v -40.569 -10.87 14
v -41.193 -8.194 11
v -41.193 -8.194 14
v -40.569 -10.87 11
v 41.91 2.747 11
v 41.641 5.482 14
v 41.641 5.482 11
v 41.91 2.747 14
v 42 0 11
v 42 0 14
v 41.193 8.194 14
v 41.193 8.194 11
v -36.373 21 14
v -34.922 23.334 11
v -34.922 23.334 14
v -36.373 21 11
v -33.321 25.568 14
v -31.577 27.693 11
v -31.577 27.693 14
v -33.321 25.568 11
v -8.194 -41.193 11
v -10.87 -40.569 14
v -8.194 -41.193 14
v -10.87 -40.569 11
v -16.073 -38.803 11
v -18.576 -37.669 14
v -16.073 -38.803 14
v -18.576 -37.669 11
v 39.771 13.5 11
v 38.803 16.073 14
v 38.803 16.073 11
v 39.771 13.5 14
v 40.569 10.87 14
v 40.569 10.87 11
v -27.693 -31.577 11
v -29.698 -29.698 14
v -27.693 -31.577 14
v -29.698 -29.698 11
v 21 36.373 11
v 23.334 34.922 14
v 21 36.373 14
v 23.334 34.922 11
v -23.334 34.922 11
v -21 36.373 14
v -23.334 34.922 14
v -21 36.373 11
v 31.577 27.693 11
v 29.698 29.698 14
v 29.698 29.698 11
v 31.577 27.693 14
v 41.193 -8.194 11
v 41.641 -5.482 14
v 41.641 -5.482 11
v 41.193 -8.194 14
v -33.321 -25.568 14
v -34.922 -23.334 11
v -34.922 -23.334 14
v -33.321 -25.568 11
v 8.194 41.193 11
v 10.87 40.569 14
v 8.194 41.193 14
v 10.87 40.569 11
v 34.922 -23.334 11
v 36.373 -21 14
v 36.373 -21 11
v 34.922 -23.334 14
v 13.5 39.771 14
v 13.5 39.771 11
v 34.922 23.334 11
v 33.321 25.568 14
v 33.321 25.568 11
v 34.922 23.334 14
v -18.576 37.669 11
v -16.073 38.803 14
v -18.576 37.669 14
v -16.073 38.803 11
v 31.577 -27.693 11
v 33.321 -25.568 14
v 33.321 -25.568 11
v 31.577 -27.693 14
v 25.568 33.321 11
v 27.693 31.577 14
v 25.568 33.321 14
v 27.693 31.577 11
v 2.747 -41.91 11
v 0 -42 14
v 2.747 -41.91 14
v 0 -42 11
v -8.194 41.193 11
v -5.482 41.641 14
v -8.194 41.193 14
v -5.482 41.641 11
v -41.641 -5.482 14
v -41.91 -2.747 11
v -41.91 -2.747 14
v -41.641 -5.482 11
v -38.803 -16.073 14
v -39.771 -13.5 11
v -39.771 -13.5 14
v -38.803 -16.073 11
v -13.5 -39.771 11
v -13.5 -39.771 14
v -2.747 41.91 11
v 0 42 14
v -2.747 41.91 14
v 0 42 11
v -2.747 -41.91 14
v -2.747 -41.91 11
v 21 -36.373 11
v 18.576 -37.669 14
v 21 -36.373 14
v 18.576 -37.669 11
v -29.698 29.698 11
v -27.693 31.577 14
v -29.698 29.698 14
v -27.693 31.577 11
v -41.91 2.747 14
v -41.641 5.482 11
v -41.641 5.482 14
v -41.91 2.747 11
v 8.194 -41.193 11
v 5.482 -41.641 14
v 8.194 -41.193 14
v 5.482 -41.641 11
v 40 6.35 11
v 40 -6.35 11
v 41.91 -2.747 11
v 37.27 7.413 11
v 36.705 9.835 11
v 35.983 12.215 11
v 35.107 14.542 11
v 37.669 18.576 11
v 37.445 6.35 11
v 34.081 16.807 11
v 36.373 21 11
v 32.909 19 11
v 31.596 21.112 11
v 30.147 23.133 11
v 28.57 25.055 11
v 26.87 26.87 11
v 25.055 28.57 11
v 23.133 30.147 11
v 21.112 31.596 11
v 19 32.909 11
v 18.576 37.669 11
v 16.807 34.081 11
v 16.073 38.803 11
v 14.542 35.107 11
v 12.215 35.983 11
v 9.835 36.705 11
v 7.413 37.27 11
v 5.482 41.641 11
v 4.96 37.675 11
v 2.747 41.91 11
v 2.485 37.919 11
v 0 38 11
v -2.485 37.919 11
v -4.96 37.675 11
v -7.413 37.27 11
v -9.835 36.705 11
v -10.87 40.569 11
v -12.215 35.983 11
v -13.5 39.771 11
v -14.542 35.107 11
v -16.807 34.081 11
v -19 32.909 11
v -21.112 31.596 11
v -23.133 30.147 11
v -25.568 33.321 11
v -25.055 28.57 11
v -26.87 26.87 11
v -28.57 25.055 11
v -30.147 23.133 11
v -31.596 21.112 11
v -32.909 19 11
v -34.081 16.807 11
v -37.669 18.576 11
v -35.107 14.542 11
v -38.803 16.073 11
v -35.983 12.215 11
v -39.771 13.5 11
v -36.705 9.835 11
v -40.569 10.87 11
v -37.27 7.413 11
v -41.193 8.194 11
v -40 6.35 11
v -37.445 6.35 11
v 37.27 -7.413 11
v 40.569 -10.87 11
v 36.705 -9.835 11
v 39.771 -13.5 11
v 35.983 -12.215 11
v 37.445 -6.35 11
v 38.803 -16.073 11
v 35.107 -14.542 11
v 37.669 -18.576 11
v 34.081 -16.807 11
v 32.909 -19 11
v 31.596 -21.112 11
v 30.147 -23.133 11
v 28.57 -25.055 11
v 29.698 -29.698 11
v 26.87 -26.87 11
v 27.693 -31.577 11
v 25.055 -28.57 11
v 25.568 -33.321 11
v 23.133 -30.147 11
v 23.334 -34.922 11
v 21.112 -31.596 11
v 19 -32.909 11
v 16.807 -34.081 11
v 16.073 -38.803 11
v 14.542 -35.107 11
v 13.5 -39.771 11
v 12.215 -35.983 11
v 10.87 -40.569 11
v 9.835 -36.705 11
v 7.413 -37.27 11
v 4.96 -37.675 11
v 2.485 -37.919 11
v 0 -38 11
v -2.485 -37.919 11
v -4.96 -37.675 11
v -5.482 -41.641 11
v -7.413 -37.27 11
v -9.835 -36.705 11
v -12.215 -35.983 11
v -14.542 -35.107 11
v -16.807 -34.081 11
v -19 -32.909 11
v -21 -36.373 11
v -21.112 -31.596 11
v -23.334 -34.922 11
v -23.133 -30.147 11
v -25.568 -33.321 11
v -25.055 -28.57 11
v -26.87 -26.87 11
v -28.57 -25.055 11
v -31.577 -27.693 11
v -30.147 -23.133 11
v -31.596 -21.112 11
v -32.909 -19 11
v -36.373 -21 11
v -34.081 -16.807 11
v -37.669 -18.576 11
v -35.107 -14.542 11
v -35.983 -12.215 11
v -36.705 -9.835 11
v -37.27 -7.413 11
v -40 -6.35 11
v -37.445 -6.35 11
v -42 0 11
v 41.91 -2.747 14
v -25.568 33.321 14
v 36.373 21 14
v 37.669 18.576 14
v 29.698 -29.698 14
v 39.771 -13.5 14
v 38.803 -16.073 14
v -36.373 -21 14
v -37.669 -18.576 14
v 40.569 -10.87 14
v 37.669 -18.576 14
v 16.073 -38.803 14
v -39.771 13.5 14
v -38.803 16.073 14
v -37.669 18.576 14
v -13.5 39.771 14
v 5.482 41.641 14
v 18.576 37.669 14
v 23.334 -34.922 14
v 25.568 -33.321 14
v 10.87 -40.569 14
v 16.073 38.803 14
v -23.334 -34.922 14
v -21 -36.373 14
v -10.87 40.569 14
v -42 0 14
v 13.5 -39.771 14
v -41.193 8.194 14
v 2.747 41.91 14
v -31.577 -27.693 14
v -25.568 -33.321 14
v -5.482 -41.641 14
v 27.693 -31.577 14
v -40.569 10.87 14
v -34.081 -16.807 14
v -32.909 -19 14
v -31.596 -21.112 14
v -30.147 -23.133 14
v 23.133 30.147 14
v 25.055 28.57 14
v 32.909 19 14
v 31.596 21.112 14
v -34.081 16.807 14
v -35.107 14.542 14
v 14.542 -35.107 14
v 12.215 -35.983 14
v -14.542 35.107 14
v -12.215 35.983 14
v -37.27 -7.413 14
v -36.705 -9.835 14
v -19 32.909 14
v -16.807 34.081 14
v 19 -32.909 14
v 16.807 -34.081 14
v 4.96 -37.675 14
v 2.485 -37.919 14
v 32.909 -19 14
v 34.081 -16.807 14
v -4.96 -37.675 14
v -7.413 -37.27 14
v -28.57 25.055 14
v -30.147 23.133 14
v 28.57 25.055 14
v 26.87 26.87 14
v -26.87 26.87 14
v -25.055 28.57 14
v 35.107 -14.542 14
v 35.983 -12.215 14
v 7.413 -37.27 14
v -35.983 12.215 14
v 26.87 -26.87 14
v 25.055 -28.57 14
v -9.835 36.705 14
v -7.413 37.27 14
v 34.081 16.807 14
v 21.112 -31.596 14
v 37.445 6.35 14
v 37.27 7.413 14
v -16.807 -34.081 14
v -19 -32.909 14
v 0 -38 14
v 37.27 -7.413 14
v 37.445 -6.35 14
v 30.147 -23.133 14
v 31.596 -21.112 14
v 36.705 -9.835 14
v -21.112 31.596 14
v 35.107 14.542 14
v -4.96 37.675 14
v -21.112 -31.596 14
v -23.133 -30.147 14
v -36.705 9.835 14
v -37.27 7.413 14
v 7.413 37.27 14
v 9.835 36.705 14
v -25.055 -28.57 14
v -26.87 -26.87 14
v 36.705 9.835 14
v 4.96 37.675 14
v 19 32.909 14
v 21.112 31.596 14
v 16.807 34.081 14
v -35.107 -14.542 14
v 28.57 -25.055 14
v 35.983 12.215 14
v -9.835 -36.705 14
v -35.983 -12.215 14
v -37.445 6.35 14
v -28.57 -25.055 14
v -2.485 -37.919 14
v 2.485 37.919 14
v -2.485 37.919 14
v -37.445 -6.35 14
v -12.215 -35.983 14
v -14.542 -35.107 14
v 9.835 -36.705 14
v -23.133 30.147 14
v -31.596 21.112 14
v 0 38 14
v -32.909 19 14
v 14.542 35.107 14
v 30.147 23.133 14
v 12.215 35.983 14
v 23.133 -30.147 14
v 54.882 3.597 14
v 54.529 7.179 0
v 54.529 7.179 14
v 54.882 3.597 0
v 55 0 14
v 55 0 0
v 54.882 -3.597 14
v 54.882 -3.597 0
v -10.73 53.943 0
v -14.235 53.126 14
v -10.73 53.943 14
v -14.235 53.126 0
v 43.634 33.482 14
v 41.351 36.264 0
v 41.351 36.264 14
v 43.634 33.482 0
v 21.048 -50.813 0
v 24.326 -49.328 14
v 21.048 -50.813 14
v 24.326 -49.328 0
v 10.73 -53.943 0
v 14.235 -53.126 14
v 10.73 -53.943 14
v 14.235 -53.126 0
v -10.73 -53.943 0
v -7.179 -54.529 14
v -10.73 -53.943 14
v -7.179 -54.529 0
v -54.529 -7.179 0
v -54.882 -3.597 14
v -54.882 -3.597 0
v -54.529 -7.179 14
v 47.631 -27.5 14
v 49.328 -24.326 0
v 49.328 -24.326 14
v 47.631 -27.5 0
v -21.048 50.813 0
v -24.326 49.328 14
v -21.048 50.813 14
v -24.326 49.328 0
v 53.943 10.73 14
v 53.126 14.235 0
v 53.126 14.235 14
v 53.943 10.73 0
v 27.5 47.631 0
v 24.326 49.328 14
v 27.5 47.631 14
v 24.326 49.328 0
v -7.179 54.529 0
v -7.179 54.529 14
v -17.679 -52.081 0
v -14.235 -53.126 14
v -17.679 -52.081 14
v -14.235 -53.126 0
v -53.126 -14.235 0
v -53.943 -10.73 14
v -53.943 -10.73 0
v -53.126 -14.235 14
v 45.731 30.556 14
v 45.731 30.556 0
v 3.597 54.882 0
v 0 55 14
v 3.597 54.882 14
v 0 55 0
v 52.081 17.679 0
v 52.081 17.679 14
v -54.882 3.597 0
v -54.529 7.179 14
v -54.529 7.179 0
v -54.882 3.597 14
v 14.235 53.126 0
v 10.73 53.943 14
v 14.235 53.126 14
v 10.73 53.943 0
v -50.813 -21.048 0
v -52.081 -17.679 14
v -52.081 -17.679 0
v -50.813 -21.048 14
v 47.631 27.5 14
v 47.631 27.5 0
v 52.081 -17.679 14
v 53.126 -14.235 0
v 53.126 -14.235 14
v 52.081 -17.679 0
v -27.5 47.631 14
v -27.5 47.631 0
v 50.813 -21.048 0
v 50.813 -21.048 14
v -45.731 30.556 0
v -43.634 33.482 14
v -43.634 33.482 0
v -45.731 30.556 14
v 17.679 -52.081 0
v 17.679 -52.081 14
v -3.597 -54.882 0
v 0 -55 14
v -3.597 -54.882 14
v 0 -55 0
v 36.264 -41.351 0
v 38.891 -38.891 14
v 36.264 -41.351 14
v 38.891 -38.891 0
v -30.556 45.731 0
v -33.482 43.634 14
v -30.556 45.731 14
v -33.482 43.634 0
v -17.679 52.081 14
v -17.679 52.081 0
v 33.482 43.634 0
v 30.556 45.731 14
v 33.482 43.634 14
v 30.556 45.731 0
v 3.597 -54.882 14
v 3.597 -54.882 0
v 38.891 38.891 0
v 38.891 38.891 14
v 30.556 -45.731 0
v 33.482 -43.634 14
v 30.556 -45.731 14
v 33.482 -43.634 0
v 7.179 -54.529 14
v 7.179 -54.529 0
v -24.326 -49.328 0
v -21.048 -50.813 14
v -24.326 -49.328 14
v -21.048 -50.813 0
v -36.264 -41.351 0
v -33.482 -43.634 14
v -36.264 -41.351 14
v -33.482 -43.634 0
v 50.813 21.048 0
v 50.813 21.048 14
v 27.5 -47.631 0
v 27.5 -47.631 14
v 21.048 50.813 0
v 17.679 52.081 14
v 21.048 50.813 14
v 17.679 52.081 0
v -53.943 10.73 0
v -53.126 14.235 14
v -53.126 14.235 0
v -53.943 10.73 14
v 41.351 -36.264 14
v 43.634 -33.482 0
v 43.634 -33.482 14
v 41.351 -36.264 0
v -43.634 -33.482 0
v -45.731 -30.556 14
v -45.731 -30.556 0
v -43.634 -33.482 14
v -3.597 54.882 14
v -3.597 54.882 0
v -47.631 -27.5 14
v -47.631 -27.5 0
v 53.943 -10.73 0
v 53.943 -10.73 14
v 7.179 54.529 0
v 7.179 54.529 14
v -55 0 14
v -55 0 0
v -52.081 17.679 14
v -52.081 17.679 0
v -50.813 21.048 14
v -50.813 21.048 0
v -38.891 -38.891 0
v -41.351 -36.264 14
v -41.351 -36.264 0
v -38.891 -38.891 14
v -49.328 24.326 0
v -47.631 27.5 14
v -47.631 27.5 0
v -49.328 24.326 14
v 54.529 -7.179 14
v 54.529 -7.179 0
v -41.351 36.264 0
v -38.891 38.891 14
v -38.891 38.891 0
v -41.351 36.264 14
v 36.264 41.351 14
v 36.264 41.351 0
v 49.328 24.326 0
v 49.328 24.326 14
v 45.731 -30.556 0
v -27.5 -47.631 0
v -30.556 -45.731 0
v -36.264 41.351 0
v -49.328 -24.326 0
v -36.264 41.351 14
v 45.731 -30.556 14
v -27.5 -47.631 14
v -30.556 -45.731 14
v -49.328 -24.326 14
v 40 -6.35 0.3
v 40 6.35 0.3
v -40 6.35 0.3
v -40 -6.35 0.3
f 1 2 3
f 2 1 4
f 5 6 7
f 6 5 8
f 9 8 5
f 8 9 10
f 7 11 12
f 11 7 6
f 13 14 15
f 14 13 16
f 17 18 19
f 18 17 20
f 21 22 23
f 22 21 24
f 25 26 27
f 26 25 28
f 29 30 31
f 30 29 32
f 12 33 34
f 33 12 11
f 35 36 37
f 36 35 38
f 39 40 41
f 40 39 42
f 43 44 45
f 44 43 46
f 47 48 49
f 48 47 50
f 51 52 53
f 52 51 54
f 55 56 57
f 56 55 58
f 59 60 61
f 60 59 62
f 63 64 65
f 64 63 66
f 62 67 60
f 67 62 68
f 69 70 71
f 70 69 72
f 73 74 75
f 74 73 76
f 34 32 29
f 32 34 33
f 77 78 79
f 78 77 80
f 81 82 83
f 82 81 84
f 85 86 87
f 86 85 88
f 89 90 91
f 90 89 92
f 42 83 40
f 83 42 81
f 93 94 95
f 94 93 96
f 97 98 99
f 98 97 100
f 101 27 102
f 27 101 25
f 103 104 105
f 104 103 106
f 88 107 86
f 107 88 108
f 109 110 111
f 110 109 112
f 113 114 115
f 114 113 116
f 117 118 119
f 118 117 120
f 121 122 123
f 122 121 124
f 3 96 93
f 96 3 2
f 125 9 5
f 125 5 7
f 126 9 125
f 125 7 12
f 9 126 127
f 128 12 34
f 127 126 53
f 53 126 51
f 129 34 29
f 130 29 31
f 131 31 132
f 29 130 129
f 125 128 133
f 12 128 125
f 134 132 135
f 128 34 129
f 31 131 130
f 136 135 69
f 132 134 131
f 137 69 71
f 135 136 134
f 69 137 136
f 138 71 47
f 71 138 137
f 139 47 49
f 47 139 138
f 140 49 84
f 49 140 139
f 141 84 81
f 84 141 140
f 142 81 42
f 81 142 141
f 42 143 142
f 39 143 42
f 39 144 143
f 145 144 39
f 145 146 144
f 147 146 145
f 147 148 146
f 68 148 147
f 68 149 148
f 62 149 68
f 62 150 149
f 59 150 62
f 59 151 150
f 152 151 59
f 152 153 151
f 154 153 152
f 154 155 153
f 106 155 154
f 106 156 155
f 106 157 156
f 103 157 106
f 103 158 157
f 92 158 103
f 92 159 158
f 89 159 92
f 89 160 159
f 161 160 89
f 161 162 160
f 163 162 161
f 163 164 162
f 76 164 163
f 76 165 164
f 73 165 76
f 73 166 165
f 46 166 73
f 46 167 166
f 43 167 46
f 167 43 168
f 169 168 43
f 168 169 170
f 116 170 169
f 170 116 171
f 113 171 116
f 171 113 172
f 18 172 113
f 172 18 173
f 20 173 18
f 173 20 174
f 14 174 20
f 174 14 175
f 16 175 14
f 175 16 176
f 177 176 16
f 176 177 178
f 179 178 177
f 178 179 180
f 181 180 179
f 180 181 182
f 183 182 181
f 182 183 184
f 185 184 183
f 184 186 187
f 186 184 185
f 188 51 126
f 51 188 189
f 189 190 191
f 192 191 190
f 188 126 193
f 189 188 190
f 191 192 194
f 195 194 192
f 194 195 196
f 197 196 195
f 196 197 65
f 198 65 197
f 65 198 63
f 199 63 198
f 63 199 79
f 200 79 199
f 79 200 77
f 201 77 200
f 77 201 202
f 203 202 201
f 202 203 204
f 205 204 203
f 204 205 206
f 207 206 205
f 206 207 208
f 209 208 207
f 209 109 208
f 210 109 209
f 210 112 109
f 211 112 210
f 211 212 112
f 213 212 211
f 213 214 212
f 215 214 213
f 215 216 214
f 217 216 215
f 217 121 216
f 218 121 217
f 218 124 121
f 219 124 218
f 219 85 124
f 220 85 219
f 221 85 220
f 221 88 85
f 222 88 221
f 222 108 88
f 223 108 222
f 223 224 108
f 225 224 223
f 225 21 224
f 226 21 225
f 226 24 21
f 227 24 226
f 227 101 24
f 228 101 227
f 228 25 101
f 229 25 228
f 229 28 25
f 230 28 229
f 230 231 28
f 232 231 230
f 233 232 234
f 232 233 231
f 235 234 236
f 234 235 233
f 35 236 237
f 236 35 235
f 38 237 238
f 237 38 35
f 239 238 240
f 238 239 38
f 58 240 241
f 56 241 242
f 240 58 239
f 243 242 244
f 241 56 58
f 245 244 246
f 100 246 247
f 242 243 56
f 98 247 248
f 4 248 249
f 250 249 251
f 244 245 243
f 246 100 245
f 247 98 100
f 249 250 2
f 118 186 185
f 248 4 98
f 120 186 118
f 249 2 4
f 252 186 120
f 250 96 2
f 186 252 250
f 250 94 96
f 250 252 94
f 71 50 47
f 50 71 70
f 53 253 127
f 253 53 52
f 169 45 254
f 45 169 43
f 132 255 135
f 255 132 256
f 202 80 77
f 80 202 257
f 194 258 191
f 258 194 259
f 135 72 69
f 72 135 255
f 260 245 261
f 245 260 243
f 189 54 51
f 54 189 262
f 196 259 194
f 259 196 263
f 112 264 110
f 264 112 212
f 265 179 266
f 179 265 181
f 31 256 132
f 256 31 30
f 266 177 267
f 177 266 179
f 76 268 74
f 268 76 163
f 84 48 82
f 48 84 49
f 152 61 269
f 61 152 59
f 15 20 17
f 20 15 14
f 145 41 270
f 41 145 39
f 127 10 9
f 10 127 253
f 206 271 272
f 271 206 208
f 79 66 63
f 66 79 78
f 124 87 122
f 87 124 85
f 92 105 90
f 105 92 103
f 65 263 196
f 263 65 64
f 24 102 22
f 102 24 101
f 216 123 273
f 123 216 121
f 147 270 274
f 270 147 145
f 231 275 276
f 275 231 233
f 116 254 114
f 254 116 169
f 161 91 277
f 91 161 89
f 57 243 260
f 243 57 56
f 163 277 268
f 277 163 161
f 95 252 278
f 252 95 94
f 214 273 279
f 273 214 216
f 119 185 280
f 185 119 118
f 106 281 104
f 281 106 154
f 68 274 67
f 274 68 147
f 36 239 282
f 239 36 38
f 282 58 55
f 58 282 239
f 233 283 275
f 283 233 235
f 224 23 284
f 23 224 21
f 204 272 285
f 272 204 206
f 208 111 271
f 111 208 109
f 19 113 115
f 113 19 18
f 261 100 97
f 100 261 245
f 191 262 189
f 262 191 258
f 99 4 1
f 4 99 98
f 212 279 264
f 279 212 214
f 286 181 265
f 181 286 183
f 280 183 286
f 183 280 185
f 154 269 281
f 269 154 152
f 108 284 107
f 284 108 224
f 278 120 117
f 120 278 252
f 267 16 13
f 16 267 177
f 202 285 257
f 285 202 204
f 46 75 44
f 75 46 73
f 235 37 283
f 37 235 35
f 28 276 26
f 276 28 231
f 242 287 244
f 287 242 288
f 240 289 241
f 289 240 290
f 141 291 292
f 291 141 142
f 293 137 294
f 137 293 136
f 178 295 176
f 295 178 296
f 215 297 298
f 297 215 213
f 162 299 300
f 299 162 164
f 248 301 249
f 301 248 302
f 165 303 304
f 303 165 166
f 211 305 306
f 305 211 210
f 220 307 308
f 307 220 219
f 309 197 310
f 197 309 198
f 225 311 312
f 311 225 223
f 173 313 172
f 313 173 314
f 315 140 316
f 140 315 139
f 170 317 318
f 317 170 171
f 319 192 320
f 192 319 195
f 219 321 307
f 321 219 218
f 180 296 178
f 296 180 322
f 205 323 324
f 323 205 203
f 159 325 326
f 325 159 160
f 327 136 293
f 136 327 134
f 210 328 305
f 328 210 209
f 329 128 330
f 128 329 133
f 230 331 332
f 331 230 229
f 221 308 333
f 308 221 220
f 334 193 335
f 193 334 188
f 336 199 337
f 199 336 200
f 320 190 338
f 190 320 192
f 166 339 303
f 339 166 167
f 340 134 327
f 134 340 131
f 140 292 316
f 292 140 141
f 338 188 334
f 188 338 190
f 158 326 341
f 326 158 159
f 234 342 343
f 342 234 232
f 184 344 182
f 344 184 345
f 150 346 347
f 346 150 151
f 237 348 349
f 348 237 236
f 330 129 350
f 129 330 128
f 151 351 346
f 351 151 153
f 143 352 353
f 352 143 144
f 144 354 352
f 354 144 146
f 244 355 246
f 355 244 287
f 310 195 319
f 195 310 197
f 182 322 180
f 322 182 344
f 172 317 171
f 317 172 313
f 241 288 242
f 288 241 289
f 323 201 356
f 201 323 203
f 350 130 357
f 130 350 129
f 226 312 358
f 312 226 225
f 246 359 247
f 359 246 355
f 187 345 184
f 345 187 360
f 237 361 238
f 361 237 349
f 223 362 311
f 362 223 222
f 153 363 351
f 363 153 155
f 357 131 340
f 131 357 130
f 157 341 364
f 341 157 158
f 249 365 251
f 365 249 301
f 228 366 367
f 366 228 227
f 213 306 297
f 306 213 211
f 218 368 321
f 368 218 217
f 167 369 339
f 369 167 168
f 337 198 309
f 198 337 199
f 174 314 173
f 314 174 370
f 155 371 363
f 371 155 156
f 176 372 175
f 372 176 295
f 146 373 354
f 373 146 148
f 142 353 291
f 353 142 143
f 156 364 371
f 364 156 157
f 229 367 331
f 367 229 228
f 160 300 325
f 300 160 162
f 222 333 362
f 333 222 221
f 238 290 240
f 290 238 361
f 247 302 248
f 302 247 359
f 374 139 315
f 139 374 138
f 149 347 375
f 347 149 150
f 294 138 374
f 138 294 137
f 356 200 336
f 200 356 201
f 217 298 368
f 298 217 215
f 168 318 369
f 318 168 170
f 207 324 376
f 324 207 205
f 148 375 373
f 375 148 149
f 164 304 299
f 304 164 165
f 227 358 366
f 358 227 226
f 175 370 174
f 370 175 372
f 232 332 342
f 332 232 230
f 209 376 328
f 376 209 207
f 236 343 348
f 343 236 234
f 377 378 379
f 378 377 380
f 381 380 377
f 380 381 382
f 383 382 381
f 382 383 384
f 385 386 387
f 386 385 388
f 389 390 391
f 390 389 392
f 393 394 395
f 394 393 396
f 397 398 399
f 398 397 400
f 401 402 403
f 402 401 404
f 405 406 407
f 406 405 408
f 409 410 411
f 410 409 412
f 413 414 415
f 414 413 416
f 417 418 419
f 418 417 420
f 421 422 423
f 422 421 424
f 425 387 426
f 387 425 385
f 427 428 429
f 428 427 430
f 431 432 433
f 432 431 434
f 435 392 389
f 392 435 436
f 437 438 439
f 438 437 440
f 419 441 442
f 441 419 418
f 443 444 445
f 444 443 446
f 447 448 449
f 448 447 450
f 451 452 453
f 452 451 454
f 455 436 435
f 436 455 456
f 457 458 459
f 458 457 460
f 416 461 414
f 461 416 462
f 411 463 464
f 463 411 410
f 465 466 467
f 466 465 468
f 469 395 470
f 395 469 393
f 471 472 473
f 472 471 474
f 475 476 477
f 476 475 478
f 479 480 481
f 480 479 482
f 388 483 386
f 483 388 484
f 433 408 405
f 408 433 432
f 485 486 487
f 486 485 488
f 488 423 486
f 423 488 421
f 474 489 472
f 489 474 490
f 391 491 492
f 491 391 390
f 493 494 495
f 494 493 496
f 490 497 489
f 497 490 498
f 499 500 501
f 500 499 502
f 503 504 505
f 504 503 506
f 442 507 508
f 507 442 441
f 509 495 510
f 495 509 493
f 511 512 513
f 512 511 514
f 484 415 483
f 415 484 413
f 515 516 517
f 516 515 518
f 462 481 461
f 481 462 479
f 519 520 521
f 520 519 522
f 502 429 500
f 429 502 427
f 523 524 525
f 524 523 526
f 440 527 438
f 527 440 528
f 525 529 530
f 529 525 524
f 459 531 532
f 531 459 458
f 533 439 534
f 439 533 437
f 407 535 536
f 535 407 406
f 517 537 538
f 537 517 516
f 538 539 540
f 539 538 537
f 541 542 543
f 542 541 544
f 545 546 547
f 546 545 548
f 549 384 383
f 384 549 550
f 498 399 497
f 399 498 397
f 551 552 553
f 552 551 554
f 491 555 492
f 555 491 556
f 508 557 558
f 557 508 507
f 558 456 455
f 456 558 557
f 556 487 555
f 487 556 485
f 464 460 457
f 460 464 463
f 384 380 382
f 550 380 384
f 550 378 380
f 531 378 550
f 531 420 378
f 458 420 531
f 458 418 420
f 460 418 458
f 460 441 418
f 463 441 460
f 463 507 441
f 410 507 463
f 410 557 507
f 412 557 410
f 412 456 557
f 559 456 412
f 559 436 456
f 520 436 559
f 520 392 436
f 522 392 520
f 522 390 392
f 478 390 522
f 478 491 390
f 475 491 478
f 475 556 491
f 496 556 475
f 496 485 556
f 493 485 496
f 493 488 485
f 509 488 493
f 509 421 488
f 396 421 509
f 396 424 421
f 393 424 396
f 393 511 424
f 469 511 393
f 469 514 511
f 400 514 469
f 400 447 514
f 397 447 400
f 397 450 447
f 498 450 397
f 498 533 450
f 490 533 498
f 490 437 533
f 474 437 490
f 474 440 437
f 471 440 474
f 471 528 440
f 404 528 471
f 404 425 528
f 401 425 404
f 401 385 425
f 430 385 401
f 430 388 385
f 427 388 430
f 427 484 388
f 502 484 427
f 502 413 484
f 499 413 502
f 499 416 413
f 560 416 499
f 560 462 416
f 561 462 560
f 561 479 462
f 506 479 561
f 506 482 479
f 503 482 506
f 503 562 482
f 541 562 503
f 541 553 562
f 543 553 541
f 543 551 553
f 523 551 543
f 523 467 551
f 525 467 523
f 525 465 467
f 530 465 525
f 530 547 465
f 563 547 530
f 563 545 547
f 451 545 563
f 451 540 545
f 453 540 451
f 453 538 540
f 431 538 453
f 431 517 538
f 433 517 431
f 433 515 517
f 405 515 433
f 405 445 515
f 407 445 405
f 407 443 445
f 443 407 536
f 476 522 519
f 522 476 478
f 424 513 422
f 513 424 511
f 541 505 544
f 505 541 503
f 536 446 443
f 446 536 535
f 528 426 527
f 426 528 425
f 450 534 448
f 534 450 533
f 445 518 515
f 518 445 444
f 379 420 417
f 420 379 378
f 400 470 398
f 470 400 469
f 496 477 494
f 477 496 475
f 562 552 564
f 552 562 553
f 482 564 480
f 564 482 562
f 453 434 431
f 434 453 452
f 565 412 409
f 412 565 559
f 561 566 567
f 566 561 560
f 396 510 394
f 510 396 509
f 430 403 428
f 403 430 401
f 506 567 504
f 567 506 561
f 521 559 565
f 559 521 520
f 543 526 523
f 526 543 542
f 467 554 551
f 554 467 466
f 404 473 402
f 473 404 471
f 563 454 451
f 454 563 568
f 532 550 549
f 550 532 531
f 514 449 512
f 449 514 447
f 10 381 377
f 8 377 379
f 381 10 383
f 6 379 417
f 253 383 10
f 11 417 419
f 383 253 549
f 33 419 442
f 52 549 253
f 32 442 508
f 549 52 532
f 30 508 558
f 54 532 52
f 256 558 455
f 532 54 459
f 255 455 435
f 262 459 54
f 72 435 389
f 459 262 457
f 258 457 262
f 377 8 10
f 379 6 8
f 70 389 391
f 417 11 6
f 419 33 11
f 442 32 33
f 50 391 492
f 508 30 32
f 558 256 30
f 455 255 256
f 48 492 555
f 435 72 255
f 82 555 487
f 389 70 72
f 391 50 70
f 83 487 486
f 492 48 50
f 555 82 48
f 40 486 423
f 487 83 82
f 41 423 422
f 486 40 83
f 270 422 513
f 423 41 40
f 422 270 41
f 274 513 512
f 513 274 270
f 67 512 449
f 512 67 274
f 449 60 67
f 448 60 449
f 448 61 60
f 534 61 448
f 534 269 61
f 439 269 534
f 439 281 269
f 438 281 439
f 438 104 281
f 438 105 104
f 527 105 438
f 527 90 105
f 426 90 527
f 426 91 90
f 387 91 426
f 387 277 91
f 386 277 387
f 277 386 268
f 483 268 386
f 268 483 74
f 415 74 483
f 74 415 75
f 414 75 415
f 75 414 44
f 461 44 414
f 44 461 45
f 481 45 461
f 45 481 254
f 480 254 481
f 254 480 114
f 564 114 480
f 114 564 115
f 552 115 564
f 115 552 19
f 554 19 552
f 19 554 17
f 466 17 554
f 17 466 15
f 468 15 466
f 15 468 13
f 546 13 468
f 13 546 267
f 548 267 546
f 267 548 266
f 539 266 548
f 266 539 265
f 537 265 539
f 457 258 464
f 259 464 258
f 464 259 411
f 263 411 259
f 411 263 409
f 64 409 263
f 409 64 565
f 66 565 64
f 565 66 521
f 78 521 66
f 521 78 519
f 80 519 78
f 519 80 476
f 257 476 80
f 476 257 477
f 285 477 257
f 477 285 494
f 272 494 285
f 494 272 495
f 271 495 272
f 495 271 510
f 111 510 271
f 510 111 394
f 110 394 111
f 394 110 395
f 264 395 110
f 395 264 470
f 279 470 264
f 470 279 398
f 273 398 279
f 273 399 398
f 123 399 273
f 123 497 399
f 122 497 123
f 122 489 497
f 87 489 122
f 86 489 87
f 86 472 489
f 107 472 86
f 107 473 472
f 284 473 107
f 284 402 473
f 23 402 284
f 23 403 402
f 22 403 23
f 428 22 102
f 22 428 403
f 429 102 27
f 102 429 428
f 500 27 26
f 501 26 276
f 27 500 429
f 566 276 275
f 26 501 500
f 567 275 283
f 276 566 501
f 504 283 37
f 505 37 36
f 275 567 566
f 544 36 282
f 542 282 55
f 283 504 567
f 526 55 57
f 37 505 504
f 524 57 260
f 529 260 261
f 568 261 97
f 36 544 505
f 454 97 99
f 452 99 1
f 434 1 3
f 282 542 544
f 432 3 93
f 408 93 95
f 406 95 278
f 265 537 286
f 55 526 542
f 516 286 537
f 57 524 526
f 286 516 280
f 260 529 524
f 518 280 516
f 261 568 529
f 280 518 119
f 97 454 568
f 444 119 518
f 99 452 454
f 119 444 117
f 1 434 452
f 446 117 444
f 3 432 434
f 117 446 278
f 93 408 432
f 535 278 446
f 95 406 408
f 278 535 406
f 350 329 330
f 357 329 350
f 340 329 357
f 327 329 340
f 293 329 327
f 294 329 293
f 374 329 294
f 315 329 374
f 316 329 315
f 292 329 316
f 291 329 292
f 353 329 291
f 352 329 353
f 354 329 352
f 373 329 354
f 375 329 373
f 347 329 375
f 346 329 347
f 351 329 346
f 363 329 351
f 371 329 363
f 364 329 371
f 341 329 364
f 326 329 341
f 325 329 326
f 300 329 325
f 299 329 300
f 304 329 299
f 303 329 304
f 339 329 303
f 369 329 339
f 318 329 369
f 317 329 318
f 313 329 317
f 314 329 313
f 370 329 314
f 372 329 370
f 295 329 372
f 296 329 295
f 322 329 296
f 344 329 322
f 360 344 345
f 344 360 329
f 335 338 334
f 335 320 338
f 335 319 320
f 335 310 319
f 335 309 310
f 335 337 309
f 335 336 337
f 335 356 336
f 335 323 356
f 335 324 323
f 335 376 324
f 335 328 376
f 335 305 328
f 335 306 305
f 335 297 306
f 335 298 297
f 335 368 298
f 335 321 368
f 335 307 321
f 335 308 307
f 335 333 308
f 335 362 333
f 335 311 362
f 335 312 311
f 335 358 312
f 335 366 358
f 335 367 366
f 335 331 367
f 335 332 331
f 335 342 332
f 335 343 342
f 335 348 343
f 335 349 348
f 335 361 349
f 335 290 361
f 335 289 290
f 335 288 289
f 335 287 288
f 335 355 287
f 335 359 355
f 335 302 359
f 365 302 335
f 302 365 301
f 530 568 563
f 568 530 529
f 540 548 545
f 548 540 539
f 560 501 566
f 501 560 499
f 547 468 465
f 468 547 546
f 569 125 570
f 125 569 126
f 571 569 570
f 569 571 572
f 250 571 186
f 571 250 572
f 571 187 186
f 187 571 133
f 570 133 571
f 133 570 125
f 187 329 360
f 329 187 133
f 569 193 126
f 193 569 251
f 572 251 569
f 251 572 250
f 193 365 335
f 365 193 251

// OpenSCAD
// Drikkeunderlag med vektcelle-lomme og lysring (prototype, mm)
$fn = 96;

D      = 110;    // underlagets diameter
H      = 14;     // tykkelse
LC_L   = 80;     // vektcelle, lengde [verifiser mot datablad]
LC_W   = 12.7;   // vektcelle, bredde
LC_H   = 12.7;   // vektcelle, høyde
RING_R = 40;     // radius for lysring
RING_W = 4;      // bredde på lysring-spor
KAB_W  = 6;      // kabelkanal

difference() {
    cylinder(d = D, h = H);

    // lomme for vektcelle, midt i underlaget
    translate([-LC_L / 2, -LC_W / 2, H - LC_H - 1])
        cube([LC_L, LC_W, LC_H + 1]);

    // lysring-spor i overflaten, rundt koppområdet
    translate([0, 0, H - 3])
        difference() {
            cylinder(r = RING_R + RING_W / 2, h = 4);
            translate([0, 0, -1]) cylinder(r = RING_R - RING_W / 2, h = 6);
        }

    // kabelkanal fra vektcelle til kant
    translate([0, -KAB_W / 2, 0])
        cube([D / 2, KAB_W, H - LC_H - 3]);
}

// TODO: lokk for batteri/elektronikk, LED-ring montering, lysdiffusor.
